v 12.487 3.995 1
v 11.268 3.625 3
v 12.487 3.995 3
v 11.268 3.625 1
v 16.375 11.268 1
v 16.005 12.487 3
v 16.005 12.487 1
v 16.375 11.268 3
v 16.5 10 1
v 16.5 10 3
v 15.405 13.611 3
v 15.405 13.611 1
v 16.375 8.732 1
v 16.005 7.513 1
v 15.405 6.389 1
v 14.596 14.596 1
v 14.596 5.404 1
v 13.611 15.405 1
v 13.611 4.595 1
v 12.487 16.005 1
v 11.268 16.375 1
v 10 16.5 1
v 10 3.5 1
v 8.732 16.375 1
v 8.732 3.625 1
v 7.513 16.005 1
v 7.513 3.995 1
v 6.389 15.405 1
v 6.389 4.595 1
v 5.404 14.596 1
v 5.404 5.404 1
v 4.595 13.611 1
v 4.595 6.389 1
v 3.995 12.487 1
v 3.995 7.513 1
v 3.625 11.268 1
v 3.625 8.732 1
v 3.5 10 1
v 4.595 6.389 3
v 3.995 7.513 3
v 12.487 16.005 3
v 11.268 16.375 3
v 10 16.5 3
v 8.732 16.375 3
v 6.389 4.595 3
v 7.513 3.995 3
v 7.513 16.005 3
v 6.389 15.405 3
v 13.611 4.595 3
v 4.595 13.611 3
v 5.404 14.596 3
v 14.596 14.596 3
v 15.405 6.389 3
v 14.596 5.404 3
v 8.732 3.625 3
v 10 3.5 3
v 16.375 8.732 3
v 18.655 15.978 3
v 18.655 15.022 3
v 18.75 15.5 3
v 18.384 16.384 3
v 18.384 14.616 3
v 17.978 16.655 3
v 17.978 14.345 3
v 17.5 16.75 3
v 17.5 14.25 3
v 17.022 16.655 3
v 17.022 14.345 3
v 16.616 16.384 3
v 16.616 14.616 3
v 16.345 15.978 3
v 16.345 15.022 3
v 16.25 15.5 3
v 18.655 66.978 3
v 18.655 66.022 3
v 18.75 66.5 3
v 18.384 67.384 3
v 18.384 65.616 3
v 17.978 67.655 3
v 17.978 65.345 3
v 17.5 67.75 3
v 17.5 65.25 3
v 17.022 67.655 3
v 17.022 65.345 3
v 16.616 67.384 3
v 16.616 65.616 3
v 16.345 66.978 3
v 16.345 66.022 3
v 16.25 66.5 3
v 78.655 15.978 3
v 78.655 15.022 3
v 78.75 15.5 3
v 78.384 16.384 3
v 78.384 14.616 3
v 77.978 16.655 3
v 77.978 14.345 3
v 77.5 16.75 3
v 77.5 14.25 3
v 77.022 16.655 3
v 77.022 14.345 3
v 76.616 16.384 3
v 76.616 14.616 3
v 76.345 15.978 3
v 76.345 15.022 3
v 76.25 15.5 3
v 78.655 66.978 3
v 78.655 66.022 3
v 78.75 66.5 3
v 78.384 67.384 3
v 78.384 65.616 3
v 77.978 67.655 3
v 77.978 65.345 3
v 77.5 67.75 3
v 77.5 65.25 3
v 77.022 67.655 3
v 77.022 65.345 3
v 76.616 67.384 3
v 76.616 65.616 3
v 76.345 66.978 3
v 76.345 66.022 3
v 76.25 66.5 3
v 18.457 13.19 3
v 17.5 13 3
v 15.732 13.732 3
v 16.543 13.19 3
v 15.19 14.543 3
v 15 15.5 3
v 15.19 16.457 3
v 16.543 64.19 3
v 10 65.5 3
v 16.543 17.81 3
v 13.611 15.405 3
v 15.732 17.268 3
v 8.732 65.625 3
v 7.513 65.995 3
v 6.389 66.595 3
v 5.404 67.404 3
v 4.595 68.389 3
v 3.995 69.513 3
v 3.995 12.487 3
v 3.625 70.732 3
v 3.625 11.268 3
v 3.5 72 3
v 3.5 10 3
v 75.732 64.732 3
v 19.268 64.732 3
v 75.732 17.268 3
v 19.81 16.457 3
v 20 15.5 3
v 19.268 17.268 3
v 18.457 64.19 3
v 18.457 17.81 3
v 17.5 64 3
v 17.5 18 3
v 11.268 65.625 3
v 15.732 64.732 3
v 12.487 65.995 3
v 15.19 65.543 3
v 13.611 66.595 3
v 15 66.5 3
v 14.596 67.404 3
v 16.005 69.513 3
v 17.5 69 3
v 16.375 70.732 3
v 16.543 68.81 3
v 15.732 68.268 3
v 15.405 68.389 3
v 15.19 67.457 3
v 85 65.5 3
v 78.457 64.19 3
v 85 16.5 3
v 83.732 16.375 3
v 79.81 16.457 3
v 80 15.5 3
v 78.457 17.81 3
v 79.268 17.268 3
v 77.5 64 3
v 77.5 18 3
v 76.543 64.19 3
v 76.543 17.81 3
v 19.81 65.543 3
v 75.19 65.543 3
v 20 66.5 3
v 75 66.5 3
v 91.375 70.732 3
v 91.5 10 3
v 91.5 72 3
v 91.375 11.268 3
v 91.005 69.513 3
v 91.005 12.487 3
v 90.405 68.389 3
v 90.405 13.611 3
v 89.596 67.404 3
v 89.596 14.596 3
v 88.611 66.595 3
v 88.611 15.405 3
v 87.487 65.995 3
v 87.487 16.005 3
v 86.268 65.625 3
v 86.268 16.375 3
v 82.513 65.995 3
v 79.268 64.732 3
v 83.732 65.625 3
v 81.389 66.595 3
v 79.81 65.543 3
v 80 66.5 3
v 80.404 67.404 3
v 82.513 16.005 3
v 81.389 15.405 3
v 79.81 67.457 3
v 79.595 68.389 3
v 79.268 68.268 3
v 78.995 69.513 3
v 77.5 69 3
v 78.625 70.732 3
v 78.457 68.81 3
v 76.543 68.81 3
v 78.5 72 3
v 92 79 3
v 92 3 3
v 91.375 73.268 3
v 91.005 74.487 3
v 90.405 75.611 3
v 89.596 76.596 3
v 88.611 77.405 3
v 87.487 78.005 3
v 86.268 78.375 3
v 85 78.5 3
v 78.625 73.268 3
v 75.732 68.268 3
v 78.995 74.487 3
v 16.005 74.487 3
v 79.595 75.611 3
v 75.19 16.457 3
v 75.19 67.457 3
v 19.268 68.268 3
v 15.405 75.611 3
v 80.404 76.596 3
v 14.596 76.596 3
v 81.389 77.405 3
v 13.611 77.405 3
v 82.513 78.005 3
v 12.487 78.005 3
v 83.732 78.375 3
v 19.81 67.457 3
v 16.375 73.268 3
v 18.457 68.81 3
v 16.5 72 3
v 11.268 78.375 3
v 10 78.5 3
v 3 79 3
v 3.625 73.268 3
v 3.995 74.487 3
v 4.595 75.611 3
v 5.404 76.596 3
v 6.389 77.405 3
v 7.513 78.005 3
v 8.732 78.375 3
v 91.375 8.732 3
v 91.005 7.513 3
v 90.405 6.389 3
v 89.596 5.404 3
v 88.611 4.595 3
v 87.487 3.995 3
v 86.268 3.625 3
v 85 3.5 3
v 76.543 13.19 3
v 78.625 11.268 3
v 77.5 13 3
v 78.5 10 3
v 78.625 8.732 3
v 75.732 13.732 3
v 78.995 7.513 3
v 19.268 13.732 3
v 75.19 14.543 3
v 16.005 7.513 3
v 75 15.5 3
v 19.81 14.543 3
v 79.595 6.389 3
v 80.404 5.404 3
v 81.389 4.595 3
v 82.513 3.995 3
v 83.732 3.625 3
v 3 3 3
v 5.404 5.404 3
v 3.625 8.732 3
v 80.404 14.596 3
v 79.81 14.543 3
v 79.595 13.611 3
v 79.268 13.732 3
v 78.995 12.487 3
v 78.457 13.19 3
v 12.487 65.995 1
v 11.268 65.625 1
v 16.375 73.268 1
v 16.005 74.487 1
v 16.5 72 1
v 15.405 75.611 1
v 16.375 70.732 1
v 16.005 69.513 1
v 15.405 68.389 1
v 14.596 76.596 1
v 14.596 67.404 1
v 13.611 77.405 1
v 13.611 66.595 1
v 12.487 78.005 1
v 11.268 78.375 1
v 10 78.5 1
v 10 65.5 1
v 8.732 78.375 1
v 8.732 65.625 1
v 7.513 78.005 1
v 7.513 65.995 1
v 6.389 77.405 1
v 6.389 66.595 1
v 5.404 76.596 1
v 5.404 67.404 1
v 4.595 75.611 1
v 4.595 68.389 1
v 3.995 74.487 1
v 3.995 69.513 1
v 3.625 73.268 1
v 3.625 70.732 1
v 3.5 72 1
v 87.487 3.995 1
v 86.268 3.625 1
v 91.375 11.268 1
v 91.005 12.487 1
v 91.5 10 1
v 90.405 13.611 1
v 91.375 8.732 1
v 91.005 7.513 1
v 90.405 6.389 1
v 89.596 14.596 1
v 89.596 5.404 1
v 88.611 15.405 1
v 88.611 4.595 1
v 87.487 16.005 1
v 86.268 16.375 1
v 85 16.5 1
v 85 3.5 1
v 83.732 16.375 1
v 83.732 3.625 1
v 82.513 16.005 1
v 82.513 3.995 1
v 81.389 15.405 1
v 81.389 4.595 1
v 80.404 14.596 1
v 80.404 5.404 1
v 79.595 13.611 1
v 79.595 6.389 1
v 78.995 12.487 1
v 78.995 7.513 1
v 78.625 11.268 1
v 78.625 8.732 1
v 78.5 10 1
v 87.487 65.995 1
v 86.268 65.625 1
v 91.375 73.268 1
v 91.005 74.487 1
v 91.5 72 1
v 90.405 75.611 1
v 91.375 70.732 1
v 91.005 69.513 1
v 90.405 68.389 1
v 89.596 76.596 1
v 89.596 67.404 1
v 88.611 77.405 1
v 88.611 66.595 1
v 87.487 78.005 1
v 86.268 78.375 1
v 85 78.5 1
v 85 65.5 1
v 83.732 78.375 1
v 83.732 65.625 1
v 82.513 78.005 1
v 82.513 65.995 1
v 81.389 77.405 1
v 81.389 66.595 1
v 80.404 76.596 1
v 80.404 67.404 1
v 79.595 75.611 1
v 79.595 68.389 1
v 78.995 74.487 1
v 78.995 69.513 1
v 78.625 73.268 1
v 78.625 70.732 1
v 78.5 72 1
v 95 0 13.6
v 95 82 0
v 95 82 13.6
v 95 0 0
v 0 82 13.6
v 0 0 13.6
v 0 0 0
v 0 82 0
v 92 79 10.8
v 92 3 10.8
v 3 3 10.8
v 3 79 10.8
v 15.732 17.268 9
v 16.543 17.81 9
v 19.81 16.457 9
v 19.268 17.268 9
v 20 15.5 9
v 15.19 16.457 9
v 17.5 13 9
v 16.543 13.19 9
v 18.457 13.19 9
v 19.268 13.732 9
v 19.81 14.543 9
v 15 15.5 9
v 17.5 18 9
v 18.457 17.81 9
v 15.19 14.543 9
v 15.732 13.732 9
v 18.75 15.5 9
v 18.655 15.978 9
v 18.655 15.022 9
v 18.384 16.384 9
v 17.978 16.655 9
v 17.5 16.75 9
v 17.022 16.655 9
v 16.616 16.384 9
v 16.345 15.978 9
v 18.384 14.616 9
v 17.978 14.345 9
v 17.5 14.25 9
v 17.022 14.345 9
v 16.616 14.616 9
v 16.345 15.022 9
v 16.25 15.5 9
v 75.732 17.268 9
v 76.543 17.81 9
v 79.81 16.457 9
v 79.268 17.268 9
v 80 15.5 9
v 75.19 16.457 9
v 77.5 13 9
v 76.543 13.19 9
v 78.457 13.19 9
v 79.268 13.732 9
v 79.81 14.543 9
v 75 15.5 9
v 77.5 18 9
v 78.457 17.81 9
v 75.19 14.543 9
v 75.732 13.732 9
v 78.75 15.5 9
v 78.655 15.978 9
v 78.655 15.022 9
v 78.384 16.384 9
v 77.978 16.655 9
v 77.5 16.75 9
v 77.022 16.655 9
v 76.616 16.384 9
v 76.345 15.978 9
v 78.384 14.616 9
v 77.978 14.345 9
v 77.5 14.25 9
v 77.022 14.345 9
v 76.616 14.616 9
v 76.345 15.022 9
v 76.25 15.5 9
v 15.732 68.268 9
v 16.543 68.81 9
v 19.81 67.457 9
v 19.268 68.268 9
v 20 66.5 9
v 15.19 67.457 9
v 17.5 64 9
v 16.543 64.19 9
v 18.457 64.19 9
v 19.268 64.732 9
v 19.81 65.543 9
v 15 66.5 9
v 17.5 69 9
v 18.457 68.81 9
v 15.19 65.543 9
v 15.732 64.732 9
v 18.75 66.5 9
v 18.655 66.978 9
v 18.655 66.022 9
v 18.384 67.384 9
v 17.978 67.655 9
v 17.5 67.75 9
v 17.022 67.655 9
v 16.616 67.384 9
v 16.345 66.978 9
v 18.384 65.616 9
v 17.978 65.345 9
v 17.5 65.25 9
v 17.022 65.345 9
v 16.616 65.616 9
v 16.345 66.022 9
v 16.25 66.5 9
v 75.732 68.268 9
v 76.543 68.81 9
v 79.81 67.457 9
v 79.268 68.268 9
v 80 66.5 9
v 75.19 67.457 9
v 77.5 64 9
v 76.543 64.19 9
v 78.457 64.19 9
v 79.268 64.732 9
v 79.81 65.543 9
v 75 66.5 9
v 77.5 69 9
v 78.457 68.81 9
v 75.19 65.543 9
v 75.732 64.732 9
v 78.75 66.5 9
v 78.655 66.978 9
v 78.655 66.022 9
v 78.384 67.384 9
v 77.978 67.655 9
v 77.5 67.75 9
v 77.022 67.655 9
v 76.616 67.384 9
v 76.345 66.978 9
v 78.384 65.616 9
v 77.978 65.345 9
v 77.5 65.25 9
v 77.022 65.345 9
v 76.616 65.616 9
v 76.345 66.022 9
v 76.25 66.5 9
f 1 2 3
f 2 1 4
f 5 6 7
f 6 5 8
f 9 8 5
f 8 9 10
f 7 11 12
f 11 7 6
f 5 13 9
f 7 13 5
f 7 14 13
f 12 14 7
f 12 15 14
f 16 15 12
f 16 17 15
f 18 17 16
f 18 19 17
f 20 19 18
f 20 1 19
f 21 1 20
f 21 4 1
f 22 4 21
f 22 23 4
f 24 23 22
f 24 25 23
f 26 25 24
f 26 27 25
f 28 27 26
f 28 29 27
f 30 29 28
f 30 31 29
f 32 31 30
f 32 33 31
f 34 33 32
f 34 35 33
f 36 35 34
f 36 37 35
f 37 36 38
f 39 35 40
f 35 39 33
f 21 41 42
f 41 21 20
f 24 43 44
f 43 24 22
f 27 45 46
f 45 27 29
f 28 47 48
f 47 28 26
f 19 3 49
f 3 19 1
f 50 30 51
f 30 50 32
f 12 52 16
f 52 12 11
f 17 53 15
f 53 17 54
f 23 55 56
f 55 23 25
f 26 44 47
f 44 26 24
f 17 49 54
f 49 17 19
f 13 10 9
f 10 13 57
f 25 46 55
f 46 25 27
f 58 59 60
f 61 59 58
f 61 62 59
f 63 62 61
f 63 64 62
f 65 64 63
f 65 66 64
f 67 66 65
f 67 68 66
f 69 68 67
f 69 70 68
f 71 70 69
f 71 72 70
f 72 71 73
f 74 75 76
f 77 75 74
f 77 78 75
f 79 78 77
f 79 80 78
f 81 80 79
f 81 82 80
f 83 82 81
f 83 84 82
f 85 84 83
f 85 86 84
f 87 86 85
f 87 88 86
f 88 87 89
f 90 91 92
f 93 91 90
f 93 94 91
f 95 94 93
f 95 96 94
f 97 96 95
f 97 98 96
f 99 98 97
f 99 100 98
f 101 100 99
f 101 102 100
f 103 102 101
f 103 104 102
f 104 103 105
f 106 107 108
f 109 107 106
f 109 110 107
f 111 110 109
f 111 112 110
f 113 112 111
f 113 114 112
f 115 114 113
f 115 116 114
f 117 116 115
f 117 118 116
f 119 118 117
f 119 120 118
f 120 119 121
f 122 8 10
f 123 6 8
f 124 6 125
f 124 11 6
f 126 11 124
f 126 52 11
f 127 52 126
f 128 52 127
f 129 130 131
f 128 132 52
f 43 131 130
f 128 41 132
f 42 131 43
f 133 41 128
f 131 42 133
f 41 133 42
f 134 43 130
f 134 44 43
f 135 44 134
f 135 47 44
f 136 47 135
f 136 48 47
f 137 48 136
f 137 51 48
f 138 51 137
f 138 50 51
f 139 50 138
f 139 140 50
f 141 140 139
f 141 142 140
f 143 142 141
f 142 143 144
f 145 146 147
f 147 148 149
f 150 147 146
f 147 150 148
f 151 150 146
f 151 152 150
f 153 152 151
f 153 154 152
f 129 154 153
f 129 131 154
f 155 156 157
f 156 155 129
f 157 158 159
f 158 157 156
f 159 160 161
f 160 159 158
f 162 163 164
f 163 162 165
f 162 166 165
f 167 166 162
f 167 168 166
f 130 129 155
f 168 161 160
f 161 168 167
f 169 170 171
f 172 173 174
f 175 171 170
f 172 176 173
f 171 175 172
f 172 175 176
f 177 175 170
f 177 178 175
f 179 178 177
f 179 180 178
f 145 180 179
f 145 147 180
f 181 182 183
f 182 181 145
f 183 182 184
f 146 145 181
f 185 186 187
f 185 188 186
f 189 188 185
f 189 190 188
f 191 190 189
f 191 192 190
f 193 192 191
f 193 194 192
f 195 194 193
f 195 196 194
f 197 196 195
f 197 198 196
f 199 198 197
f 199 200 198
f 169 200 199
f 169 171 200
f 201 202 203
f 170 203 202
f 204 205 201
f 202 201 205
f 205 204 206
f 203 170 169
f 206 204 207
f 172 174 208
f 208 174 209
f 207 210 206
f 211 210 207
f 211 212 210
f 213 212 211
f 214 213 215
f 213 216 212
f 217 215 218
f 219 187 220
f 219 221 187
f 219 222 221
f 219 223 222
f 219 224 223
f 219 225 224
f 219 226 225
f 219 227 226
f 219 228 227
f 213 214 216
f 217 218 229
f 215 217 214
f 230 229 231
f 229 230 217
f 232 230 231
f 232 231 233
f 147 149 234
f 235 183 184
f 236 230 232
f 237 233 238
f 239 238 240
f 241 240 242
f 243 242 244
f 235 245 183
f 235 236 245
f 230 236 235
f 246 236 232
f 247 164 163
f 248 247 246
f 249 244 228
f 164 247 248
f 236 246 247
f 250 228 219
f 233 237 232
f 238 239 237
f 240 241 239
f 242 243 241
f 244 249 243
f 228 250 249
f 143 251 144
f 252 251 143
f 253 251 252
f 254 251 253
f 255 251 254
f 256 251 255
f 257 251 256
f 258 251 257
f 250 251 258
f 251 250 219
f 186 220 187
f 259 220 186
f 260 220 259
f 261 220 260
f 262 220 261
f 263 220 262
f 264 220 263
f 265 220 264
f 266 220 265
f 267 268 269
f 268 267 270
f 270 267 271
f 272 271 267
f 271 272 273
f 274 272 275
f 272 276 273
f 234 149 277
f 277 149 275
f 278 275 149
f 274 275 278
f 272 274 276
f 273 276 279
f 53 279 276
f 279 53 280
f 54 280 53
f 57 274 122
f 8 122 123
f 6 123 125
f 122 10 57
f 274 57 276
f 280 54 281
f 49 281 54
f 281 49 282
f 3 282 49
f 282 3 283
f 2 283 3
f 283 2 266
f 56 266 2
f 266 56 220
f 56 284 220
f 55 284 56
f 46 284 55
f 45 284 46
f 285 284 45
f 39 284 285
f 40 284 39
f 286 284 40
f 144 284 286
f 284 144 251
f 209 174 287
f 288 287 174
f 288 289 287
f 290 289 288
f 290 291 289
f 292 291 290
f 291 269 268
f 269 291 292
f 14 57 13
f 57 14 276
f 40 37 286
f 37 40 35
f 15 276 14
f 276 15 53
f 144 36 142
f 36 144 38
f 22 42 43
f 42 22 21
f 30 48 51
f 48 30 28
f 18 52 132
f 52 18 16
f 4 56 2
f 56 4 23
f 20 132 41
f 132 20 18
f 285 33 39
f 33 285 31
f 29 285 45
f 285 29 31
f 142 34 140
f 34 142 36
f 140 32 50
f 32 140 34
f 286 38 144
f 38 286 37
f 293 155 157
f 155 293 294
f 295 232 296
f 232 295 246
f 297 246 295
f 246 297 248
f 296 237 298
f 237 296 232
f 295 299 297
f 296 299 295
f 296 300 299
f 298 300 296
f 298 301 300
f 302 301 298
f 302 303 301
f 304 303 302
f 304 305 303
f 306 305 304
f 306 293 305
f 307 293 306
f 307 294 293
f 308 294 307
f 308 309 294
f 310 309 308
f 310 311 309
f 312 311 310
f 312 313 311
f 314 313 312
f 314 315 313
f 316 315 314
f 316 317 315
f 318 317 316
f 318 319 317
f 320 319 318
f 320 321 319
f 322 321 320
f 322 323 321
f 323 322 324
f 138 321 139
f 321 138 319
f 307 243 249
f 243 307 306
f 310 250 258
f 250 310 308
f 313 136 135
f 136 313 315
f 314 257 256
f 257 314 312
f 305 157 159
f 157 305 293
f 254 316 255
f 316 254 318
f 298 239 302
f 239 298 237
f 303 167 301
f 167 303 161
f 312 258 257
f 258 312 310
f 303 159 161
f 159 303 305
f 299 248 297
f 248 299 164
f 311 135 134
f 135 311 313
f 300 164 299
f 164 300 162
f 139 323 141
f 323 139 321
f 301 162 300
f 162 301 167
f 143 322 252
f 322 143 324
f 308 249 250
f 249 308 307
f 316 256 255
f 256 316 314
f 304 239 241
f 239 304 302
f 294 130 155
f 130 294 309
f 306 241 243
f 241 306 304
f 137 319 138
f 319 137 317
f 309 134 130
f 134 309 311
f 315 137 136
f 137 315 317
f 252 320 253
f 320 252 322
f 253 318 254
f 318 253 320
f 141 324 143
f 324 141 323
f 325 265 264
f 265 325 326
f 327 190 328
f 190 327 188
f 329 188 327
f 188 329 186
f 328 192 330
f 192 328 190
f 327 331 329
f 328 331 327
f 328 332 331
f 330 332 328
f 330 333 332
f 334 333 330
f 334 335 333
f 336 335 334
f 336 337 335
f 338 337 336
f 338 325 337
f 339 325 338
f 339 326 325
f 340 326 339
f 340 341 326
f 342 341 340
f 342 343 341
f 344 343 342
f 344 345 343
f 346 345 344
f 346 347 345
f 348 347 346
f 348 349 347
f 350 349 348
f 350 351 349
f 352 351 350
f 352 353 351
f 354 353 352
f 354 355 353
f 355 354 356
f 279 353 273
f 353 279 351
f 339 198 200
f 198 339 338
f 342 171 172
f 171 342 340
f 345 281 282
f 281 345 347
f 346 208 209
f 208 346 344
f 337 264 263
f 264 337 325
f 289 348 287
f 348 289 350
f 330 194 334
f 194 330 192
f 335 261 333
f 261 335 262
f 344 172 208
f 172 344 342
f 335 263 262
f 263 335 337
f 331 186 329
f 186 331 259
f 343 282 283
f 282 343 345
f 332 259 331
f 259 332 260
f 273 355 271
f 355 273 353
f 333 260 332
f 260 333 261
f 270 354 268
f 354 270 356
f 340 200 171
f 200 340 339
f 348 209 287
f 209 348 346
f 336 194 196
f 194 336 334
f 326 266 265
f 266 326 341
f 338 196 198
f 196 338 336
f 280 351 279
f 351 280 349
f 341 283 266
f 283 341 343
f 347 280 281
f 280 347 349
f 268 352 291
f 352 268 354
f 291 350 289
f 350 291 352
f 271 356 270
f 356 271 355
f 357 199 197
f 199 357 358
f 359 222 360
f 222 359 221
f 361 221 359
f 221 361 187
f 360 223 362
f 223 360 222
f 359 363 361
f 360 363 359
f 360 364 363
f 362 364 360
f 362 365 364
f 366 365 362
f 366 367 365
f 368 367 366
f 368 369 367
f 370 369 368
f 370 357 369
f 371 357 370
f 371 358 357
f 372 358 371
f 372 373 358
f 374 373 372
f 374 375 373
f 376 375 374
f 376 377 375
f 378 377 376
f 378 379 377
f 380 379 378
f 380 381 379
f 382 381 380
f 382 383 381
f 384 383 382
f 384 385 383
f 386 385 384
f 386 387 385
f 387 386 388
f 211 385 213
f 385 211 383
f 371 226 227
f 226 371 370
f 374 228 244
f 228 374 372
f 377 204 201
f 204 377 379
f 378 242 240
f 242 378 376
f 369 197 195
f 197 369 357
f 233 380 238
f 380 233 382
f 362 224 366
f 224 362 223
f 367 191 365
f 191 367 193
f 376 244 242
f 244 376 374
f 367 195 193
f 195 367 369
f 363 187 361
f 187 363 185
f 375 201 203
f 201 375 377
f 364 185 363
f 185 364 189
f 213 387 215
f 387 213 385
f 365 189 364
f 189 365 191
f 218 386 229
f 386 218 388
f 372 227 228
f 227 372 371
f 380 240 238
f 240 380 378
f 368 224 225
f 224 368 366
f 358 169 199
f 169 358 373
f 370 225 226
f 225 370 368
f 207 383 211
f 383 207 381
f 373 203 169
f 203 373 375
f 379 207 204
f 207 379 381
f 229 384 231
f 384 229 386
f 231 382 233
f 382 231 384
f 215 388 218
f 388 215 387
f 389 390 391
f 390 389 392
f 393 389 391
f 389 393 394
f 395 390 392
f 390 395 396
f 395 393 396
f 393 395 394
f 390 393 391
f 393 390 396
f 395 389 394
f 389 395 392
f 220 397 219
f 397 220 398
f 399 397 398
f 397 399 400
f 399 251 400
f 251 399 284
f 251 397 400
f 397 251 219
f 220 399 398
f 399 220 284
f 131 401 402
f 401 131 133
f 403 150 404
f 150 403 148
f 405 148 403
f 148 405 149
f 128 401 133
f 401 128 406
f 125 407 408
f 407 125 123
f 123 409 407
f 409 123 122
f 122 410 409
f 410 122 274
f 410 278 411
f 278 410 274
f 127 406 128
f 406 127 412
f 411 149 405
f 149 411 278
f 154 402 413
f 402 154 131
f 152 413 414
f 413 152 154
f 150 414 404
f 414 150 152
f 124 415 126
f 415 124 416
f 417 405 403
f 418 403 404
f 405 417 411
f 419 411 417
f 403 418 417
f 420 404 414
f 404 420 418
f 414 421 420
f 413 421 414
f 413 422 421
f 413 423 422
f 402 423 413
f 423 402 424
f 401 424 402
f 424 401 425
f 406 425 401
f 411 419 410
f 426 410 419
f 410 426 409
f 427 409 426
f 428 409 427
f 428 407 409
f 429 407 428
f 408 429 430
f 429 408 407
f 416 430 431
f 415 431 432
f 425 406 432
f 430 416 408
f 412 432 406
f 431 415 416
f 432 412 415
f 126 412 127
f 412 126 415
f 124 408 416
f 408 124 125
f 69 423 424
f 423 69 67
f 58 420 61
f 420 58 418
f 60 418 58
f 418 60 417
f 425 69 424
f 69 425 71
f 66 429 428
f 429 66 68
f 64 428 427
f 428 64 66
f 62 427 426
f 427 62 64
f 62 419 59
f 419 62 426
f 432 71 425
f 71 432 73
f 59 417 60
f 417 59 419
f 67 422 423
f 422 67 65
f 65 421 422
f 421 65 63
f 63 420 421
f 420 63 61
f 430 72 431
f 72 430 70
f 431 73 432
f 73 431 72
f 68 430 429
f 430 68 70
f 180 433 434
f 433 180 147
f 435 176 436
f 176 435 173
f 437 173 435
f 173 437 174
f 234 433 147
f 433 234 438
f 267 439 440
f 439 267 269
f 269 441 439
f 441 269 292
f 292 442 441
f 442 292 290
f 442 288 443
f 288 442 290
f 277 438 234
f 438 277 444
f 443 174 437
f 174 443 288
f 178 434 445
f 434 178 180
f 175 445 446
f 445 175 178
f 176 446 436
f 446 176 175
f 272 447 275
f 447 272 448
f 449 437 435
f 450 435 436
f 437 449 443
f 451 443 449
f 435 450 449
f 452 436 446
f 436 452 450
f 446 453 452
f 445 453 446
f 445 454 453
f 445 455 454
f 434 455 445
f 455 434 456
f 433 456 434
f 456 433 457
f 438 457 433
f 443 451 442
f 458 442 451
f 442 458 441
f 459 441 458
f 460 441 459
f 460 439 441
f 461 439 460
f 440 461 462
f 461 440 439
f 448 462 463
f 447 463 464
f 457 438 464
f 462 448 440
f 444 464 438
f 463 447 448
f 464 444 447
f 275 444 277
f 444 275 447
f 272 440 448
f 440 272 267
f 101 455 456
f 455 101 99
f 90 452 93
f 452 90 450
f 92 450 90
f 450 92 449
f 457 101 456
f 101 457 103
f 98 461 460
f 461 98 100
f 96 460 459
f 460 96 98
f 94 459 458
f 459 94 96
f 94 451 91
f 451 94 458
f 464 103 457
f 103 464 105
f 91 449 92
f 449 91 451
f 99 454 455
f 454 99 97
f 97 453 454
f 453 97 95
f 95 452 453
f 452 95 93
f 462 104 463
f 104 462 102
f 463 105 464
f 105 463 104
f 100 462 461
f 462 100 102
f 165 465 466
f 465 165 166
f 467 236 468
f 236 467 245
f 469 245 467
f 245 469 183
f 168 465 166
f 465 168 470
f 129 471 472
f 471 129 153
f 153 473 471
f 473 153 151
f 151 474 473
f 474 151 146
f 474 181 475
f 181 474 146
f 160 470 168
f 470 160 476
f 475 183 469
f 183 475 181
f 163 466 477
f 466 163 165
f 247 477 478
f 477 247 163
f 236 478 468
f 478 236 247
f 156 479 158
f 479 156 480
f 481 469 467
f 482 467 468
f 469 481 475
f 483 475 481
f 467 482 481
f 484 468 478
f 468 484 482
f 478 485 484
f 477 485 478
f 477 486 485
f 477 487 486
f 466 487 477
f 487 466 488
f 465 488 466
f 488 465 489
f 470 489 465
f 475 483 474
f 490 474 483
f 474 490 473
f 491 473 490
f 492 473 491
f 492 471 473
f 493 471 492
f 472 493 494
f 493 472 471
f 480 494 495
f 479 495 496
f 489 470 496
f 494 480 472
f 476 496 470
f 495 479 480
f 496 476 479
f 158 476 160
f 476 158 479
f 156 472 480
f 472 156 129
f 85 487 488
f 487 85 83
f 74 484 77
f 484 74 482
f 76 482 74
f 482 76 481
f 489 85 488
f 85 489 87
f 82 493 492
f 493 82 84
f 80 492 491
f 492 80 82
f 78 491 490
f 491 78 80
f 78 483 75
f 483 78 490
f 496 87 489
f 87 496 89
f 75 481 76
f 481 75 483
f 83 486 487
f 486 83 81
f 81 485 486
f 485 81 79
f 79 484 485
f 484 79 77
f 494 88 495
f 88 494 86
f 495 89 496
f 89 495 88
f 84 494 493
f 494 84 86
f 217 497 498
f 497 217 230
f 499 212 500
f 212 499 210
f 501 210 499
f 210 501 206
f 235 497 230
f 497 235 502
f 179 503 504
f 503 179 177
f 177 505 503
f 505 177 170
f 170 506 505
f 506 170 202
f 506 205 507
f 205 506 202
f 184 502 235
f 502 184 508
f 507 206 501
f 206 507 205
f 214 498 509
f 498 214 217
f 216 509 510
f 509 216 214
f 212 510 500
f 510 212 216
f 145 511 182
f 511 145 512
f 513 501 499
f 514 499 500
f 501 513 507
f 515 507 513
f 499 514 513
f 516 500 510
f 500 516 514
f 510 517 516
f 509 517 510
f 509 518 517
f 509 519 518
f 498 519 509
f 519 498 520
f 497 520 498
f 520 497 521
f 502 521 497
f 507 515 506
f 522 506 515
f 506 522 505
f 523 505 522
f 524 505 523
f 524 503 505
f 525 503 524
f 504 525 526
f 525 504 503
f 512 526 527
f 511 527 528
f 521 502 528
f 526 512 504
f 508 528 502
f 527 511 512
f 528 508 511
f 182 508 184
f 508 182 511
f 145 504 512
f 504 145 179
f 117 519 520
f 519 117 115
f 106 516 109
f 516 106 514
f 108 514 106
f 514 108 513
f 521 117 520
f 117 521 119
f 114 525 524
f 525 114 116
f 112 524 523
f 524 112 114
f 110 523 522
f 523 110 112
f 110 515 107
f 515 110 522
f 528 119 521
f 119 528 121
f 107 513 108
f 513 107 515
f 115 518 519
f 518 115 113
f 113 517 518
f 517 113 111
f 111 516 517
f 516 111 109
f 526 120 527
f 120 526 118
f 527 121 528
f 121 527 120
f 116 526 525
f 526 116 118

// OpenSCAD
// =============================================================================
// ISKANDER HEARTH — Tier 1 Seed Node Glass Box Attachment v1
// File: tier1_seed_case_v1.scad
// =============================================================================
// License : CERN Open Hardware Licence v2 – Strongly Reciprocal (CERN-OHL-S)
//           https://ohwr.org/cern_ohl_s_v2.txt
// Phase   : 8 — Distributed Cooperative Manufacturing
//
// WHAT THIS IS:
//   Tier 1 uses a refurbished N100 Mini PC or equivalent 1L SFF computer.
//   These machines have no internal expansion — the Solidarity HAT cannot be
//   installed inside the host. This file defines a compact EXTERNAL enclosure
//   that houses the Solidarity HAT PCB and provides the full Glass Box UX
//   (HITL buttons + NeoPixel status strip) as a standalone desktop accessory.
//
//   The enclosure sits alongside the mini PC, connected via:
//     - USB-I2C bridge cable (I2C to HAT: INA3221 + ATECC608B)
//     - USB-A to HAT GPIO header adapter (kill switch GPIO, button GPIO)
//     - USB-C power input (5V from host or wall adapter)
//
// CONTENTS:
//   Solidarity HAT PCB (65×56mm, 1.6mm FR4, 4 M3 standoffs at corners)
//   2× Sanwa OBSA-30 arcade buttons (Veto / Sign) on front face
//   WS2812B NeoPixel strip (30 LEDs, 0.5m, trimmed to 150mm for this case)
//   3mm frosted acrylic diffuser panel (top window, 140×12mm)
//   JST-XH cable exit on rear for USB-I2C + USB-C power
//   3× toggle switches (Mic / Wi-Fi / GPU kill) on rear panel
//
// FORM FACTOR:
//   Footprint: 160×90mm (fits on desk beside any 1L Mini PC)
//   Height: 60mm (shorter than a stack of 3 paperback books)
//   Style: Two-part (base + lid) — lid lifts vertically, retained by M3 clips
//
// PRINT SETTINGS:
//   Material : PETG (black, grey, or natural)
//   Layer    : 0.2mm
//   Perimeters: 3
//   Infill   : 30% gyroid
//   Supports : No supports needed — all features designed for flat print orientation
//   Orientation: Base lies on build surface (flat). Lid lies on build surface (flat).
// =============================================================================


// =============================================================================
// SECTION 1 — PARAMETERS
// =============================================================================

// --- Solidarity HAT PCB ---
hat_w           = 65.0;     // [mm] HAT PCB width
hat_d           = 56.0;     // [mm] HAT PCB depth
hat_pcb_t       = 1.6;      // [mm] PCB thickness (FR4)
hat_hole_inset  = 2.5;      // [mm] M3 mounting hole from PCB edge
hat_hole_d      = 3.2;      // [mm] M3 clearance diameter
hat_standoff_h  = 6.0;      // [mm] Standoff height (clears J1 through-hole pins)
hat_standoff_od = 5.0;      // [mm] Standoff OD

// --- Enclosure body ---
wall_t          = 3.0;      // [mm] Wall thickness
base_margin_x   = 12;       // [mm] Margin beyond HAT on X (room for buttons + side walls)
base_margin_y   = 10;       // [mm] Margin beyond HAT on Y (clearance for connectors)
lid_h           = 25;       // [mm] Lid height above base top face (PCB components clearance)

// Derived interior and exterior dimensions
int_w = hat_w + base_margin_x * 2;         // Interior width  = 65 + 24 = 89mm
int_d = hat_d + base_margin_y * 2;         // Interior depth  = 56 + 20 = 76mm
int_h_base = hat_standoff_h + hat_pcb_t;   // Base interior height (to PCB top face) ≈ 7.6mm

ext_w = int_w + wall_t * 2;                // Exterior width  ≈ 95mm
ext_d = int_d + wall_t * 2;                // Exterior depth  ≈ 82mm
ext_h_base = int_h_base + wall_t * 2;      // Base box total height ≈ 14mm (tray)
ext_h_lid  = lid_h + wall_t;               // Lid total height ≈ 28mm

// Combined exterior height (base + lid assembled)
ext_h_total = ext_h_base + ext_h_lid;      // ≈ 42mm (trim if larger than 60mm target)

// --- HITL Buttons (Sanwa OBSA-30) ---
btn_mount_d     = 30.0;     // [mm] Mounting hole diameter
btn_clear_d     = 31.5;     // [mm] Clearance hole (+ fit tolerance)
btn_spacing     = 44.0;     // [mm] Centre-to-centre between buttons
fit_t           = 0.4;      // [mm] General fit tolerance

// --- NeoPixel diffuser window (top lid, trimmed 150mm strip) ---
diffuser_w      = 150;      // [mm] Trimmed NeoPixel strip length for this case
diffuser_h      = 12;       // [mm] Diffuser window height (covers 10mm strip + 1mm each side)
diffuser_t      = 3;        // [mm] 3mm frosted acrylic

// --- Kill switches (rear panel, 3× SPDT toggle, M12 mount) ---
ks_mount_d      = 12.5;     // [mm] M12 toggle switch mounting hole clearance
ks_spacing      = 22;       // [mm] Centre-to-centre spacing between kill switches
ks_row_z        = ext_h_base + lid_h * 0.5; // [mm] Centred on rear panel height

// --- Wire exit port (rear panel) ---
wire_port_w     = 20;       // [mm] Wide slot for USB-I2C + USB-C cable bundle
wire_port_h     = 12;       // [mm] Height of slot

// --- Lid retention clips ---
clip_w          = 6;        // [mm] Clip tab width
clip_h          = 4;        // [mm] Clip tab height (engages lid rim)
clip_inset      = 8;        // [mm] Distance from corner to clip tab centre

// --- Rubber foot recesses (base bottom face) ---
foot_d          = 12;       // [mm] Adhesive rubber foot diameter (self-adhesive bumpon)
foot_inset      = 10;       // [mm] Distance from corner to foot centre

// --- QR surface (left side of lid) ---
qr_size         = 22;       // [mm] QR sticker area (compact — smaller than chassis v1)
qr_border       = 1.5;      // [mm] Raised border around recess
qr_recess_d     = 0.6;      // [mm] Recess depth for sticker

qr_platform_w   = qr_size + qr_border * 2;
qr_platform_h_3d = 2.5;     // [mm] Platform protrusion height


// =============================================================================
// SECTION 2 — HELPER MODULES
// =============================================================================

// M3 standoff (printed — tap after printing, or press-fit M3 heat-set insert)
module hat_standoff() {
    difference() {
        cylinder(d = hat_standoff_od, h = hat_standoff_h, $fn = 16);
        translate([0, 0, -0.1])
        cylinder(d = 2.5, h = hat_standoff_h + 0.2, $fn = 16);  // 2.5mm = M3 tap drill
    }
}

// Small QR surface for compact case lid exterior
module qr_surface_compact() {
    difference() {
        cube([qr_platform_w, qr_platform_w, qr_platform_h_3d]);
        translate([qr_border, qr_border, qr_platform_h_3d - qr_recess_d])
        cube([qr_size, qr_size, qr_recess_d + 0.1]);
    }
}

// Rubber foot recess on bottom face
module foot_recess() {
    cylinder(d = foot_d + 1, h = 2, $fn = 32);
}


// =============================================================================
// SECTION 3 — BASE MODULE
// =============================================================================
//
// The base is a shallow tray (open at top) that holds the Solidarity HAT PCB
// on four printed standoffs. The HAT is secured by M3×5 screws threading into
// the standoffs (tap M3 after printing, or use M3 heat-set inserts).
//
// The base clips to the lid from below. Four clip tabs on the interior rim
// engage matching notches in the lid's lower edge.

module seed_case_base() {

    // HAT PCB mounting hole positions (relative to base interior origin)
    hat_x_off = base_margin_x;  // HAT sits flush with interior margin
    hat_y_off = base_margin_y;
    hat_holes = [
        [hat_x_off + hat_hole_inset,         hat_y_off + hat_hole_inset],
        [hat_x_off + hat_w - hat_hole_inset, hat_y_off + hat_hole_inset],
        [hat_x_off + hat_hole_inset,         hat_y_off + hat_d - hat_hole_inset],
        [hat_x_off + hat_w - hat_hole_inset, hat_y_off + hat_d - hat_hole_inset],
    ];

    difference() {
        // Base tray exterior body
        cube([ext_w, ext_d, ext_h_base]);

        // Hollow interior
        translate([wall_t, wall_t, wall_t])
        cube([int_w, int_d, int_h_base + 0.2]);

        // Rubber foot recesses on bottom face
        for (fx = [foot_inset, ext_w - foot_inset]) {
            for (fy = [foot_inset, ext_d - foot_inset]) {
                translate([fx, fy, wall_t - 2])
                foot_recess();
            }
        }
    }

    // HAT standoffs — 4× printed standoff at hole positions
    for (pos = hat_holes) {
        translate([wall_t + pos[0], wall_t + pos[1], wall_t])
        hat_standoff();
    }
}


// =============================================================================
// SECTION 4 — LID MODULE
// =============================================================================
//
// The lid slides down over the base and is retained by four spring clips
// (two on front, two on rear). A diffuser window slot on the top face accepts
// the trimmed 150mm NeoPixel strip behind 3mm frosted acrylic.
//
// Front face: 2× 30mm button holes (Veto left, Sign right), centred vertically.
// Rear face: 3× M12 kill-switch holes + wire exit port.
// Left face: compact QR surface (links to repair guide) — embossed on exterior.
// Right face: ventilation slots (passive airflow for HAT voltage regulators).

module seed_case_lid() {

    // Button position Z (centred on lid front face height)
    btn_z = lid_h * 0.5;

    // Kill switch row: centred on rear face height
    ks_centre_x = ext_w / 2;  // x-centre of rear face
    ks_z = lid_h * 0.5;

    difference() {
        // Lid exterior body (open at bottom, closed at top)
        cube([ext_w, ext_d, ext_h_lid]);

        // Interior hollow (lid is a capped tube, open at bottom)
        translate([wall_t, wall_t, wall_t])
        cube([int_w, int_d, ext_h_lid + 0.1]);

        // ── NeoPixel diffuser window — top face ──────────────────────────────
        // Centred on top, 150mm × 12mm slot for 3mm acrylic diffuser
        translate([ext_w / 2 - diffuser_w / 2, ext_d / 2 - diffuser_h / 2, ext_h_lid - wall_t - 0.1])
        cube([diffuser_w, diffuser_h, wall_t + 0.2]);

        // ── Front face: Veto button (left) ───────────────────────────────────
        translate([ext_w / 2 - btn_spacing / 2, -0.1, btn_z])
        rotate([-90, 0, 0])
        cylinder(d = btn_clear_d + fit_t, h = wall_t + 0.2, $fn = 64);

        // ── Front face: Sign button (right) ──────────────────────────────────
        translate([ext_w / 2 + btn_spacing / 2, -0.1, btn_z])
        rotate([-90, 0, 0])
        cylinder(d = btn_clear_d + fit_t, h = wall_t + 0.2, $fn = 64);

        // ── Rear face: 3× kill-switch holes ──────────────────────────────────
        for (i = [-1, 0, 1]) {
            translate([ks_centre_x + i * ks_spacing, ext_d - wall_t - 0.1, ks_z])
            rotate([90, 0, 0])
            cylinder(d = ks_mount_d, h = wall_t + 0.2, $fn = 32);
        }

        // ── Rear face: USB/I2C wire exit port ────────────────────────────────
        translate([ext_w / 2 - wire_port_w / 2, ext_d - wall_t - 0.1, wall_t + 2])
        cube([wire_port_w, wall_t + 0.2, wire_port_h]);

        // ── Right face: passive ventilation slots (3 slots) ──────────────────
        slot_w   = 3;
        slot_len = lid_h * 0.6;
        slot_gap = 5;
        slot_start_y = ext_d * 0.3;
        for (n = [0 : 2]) {
            translate([ext_w - wall_t - 0.1, slot_start_y + n * (slot_w + slot_gap), lid_h * 0.2])
            cube([wall_t + 0.2, slot_w, slot_len]);
        }

        // ── Lid retention notches (base clip engagement) ──────────────────────
        // Front: 2 notches
        for (side = [clip_inset, ext_w - clip_inset - clip_w]) {
            translate([side, -0.1, -0.1])
            cube([clip_w, wall_t + 0.1, clip_h + 0.1]);
        }
        // Rear: 2 notches
        for (side = [clip_inset, ext_w - clip_inset - clip_w]) {
            translate([side, ext_d - wall_t - 0.1, -0.1])
            cube([clip_w, wall_t + 0.1, clip_h + 0.1]);
        }
    }

    // ── QR surface — left face exterior ──────────────────────────────────────
    // Mounted flush with left wall, centred in lid height
    translate([
        -qr_platform_h_3d,
        ext_d / 2 - qr_platform_w / 2,
        lid_h / 2 - qr_platform_w / 2
    ])
    rotate([0, -90, 0])
    qr_surface_compact();
}


// =============================================================================
// SECTION 5 — ASSEMBLY (EXPLODED OR ASSEMBLED)
// =============================================================================

module seed_case_assembled() {
    // Base at Z=0
    seed_case_base();

    // Lid sits directly on top of base (base top face = Z = ext_h_base)
    translate([0, 0, ext_h_base])
    seed_case_lid();
}


// =============================================================================
// SECTION 6 — RENDER
// =============================================================================
//
// Default: render base only (for first print).
// Uncomment the desired output below.
//
// PRINT GUIDE:
//   Print base and lid as separate STL files. Both print flat (no supports).
//   After printing:
//     1. Tap M3 threads in standoff holes (2.5mm pilot already in place).
//        OR: press-fit M3 heat-set inserts with soldering iron at 200°C.
//     2. Mount Solidarity HAT PCB on standoffs with M3×5 screws.
//     3. Route I2C + GPIO wiring through rear wire exit port.
//     4. Install kill switches in rear panel M12 holes (nut retains from inside).
//     5. Install Sanwa OBSA-30 buttons through front face holes (nut retains from inside).
//     6. Slide NeoPixel strip into top diffuser slot. Press 3mm acrylic in from end.
//     7. Lower lid over base. Spring clips snap into base notches.
// =============================================================================

// Render individual parts (export each separately for printing):
seed_case_base();

// seed_case_lid();              // <-- uncomment to export lid

// seed_case_assembled();        // <-- uncomment to preview assembled case

// HAT PCB ghost (for clearance check):
// %translate([wall_t + base_margin_x, wall_t + base_margin_y, wall_t + hat_standoff_h])
//   cube([hat_w, hat_d, hat_pcb_t]);

// NeoPixel strip ghost (top diffuser slot):
// %translate([ext_w/2 - diffuser_w/2, ext_d/2 - 10/2, ext_h_base + ext_h_lid - wall_t])
//   cube([diffuser_w, 10, 3]);
